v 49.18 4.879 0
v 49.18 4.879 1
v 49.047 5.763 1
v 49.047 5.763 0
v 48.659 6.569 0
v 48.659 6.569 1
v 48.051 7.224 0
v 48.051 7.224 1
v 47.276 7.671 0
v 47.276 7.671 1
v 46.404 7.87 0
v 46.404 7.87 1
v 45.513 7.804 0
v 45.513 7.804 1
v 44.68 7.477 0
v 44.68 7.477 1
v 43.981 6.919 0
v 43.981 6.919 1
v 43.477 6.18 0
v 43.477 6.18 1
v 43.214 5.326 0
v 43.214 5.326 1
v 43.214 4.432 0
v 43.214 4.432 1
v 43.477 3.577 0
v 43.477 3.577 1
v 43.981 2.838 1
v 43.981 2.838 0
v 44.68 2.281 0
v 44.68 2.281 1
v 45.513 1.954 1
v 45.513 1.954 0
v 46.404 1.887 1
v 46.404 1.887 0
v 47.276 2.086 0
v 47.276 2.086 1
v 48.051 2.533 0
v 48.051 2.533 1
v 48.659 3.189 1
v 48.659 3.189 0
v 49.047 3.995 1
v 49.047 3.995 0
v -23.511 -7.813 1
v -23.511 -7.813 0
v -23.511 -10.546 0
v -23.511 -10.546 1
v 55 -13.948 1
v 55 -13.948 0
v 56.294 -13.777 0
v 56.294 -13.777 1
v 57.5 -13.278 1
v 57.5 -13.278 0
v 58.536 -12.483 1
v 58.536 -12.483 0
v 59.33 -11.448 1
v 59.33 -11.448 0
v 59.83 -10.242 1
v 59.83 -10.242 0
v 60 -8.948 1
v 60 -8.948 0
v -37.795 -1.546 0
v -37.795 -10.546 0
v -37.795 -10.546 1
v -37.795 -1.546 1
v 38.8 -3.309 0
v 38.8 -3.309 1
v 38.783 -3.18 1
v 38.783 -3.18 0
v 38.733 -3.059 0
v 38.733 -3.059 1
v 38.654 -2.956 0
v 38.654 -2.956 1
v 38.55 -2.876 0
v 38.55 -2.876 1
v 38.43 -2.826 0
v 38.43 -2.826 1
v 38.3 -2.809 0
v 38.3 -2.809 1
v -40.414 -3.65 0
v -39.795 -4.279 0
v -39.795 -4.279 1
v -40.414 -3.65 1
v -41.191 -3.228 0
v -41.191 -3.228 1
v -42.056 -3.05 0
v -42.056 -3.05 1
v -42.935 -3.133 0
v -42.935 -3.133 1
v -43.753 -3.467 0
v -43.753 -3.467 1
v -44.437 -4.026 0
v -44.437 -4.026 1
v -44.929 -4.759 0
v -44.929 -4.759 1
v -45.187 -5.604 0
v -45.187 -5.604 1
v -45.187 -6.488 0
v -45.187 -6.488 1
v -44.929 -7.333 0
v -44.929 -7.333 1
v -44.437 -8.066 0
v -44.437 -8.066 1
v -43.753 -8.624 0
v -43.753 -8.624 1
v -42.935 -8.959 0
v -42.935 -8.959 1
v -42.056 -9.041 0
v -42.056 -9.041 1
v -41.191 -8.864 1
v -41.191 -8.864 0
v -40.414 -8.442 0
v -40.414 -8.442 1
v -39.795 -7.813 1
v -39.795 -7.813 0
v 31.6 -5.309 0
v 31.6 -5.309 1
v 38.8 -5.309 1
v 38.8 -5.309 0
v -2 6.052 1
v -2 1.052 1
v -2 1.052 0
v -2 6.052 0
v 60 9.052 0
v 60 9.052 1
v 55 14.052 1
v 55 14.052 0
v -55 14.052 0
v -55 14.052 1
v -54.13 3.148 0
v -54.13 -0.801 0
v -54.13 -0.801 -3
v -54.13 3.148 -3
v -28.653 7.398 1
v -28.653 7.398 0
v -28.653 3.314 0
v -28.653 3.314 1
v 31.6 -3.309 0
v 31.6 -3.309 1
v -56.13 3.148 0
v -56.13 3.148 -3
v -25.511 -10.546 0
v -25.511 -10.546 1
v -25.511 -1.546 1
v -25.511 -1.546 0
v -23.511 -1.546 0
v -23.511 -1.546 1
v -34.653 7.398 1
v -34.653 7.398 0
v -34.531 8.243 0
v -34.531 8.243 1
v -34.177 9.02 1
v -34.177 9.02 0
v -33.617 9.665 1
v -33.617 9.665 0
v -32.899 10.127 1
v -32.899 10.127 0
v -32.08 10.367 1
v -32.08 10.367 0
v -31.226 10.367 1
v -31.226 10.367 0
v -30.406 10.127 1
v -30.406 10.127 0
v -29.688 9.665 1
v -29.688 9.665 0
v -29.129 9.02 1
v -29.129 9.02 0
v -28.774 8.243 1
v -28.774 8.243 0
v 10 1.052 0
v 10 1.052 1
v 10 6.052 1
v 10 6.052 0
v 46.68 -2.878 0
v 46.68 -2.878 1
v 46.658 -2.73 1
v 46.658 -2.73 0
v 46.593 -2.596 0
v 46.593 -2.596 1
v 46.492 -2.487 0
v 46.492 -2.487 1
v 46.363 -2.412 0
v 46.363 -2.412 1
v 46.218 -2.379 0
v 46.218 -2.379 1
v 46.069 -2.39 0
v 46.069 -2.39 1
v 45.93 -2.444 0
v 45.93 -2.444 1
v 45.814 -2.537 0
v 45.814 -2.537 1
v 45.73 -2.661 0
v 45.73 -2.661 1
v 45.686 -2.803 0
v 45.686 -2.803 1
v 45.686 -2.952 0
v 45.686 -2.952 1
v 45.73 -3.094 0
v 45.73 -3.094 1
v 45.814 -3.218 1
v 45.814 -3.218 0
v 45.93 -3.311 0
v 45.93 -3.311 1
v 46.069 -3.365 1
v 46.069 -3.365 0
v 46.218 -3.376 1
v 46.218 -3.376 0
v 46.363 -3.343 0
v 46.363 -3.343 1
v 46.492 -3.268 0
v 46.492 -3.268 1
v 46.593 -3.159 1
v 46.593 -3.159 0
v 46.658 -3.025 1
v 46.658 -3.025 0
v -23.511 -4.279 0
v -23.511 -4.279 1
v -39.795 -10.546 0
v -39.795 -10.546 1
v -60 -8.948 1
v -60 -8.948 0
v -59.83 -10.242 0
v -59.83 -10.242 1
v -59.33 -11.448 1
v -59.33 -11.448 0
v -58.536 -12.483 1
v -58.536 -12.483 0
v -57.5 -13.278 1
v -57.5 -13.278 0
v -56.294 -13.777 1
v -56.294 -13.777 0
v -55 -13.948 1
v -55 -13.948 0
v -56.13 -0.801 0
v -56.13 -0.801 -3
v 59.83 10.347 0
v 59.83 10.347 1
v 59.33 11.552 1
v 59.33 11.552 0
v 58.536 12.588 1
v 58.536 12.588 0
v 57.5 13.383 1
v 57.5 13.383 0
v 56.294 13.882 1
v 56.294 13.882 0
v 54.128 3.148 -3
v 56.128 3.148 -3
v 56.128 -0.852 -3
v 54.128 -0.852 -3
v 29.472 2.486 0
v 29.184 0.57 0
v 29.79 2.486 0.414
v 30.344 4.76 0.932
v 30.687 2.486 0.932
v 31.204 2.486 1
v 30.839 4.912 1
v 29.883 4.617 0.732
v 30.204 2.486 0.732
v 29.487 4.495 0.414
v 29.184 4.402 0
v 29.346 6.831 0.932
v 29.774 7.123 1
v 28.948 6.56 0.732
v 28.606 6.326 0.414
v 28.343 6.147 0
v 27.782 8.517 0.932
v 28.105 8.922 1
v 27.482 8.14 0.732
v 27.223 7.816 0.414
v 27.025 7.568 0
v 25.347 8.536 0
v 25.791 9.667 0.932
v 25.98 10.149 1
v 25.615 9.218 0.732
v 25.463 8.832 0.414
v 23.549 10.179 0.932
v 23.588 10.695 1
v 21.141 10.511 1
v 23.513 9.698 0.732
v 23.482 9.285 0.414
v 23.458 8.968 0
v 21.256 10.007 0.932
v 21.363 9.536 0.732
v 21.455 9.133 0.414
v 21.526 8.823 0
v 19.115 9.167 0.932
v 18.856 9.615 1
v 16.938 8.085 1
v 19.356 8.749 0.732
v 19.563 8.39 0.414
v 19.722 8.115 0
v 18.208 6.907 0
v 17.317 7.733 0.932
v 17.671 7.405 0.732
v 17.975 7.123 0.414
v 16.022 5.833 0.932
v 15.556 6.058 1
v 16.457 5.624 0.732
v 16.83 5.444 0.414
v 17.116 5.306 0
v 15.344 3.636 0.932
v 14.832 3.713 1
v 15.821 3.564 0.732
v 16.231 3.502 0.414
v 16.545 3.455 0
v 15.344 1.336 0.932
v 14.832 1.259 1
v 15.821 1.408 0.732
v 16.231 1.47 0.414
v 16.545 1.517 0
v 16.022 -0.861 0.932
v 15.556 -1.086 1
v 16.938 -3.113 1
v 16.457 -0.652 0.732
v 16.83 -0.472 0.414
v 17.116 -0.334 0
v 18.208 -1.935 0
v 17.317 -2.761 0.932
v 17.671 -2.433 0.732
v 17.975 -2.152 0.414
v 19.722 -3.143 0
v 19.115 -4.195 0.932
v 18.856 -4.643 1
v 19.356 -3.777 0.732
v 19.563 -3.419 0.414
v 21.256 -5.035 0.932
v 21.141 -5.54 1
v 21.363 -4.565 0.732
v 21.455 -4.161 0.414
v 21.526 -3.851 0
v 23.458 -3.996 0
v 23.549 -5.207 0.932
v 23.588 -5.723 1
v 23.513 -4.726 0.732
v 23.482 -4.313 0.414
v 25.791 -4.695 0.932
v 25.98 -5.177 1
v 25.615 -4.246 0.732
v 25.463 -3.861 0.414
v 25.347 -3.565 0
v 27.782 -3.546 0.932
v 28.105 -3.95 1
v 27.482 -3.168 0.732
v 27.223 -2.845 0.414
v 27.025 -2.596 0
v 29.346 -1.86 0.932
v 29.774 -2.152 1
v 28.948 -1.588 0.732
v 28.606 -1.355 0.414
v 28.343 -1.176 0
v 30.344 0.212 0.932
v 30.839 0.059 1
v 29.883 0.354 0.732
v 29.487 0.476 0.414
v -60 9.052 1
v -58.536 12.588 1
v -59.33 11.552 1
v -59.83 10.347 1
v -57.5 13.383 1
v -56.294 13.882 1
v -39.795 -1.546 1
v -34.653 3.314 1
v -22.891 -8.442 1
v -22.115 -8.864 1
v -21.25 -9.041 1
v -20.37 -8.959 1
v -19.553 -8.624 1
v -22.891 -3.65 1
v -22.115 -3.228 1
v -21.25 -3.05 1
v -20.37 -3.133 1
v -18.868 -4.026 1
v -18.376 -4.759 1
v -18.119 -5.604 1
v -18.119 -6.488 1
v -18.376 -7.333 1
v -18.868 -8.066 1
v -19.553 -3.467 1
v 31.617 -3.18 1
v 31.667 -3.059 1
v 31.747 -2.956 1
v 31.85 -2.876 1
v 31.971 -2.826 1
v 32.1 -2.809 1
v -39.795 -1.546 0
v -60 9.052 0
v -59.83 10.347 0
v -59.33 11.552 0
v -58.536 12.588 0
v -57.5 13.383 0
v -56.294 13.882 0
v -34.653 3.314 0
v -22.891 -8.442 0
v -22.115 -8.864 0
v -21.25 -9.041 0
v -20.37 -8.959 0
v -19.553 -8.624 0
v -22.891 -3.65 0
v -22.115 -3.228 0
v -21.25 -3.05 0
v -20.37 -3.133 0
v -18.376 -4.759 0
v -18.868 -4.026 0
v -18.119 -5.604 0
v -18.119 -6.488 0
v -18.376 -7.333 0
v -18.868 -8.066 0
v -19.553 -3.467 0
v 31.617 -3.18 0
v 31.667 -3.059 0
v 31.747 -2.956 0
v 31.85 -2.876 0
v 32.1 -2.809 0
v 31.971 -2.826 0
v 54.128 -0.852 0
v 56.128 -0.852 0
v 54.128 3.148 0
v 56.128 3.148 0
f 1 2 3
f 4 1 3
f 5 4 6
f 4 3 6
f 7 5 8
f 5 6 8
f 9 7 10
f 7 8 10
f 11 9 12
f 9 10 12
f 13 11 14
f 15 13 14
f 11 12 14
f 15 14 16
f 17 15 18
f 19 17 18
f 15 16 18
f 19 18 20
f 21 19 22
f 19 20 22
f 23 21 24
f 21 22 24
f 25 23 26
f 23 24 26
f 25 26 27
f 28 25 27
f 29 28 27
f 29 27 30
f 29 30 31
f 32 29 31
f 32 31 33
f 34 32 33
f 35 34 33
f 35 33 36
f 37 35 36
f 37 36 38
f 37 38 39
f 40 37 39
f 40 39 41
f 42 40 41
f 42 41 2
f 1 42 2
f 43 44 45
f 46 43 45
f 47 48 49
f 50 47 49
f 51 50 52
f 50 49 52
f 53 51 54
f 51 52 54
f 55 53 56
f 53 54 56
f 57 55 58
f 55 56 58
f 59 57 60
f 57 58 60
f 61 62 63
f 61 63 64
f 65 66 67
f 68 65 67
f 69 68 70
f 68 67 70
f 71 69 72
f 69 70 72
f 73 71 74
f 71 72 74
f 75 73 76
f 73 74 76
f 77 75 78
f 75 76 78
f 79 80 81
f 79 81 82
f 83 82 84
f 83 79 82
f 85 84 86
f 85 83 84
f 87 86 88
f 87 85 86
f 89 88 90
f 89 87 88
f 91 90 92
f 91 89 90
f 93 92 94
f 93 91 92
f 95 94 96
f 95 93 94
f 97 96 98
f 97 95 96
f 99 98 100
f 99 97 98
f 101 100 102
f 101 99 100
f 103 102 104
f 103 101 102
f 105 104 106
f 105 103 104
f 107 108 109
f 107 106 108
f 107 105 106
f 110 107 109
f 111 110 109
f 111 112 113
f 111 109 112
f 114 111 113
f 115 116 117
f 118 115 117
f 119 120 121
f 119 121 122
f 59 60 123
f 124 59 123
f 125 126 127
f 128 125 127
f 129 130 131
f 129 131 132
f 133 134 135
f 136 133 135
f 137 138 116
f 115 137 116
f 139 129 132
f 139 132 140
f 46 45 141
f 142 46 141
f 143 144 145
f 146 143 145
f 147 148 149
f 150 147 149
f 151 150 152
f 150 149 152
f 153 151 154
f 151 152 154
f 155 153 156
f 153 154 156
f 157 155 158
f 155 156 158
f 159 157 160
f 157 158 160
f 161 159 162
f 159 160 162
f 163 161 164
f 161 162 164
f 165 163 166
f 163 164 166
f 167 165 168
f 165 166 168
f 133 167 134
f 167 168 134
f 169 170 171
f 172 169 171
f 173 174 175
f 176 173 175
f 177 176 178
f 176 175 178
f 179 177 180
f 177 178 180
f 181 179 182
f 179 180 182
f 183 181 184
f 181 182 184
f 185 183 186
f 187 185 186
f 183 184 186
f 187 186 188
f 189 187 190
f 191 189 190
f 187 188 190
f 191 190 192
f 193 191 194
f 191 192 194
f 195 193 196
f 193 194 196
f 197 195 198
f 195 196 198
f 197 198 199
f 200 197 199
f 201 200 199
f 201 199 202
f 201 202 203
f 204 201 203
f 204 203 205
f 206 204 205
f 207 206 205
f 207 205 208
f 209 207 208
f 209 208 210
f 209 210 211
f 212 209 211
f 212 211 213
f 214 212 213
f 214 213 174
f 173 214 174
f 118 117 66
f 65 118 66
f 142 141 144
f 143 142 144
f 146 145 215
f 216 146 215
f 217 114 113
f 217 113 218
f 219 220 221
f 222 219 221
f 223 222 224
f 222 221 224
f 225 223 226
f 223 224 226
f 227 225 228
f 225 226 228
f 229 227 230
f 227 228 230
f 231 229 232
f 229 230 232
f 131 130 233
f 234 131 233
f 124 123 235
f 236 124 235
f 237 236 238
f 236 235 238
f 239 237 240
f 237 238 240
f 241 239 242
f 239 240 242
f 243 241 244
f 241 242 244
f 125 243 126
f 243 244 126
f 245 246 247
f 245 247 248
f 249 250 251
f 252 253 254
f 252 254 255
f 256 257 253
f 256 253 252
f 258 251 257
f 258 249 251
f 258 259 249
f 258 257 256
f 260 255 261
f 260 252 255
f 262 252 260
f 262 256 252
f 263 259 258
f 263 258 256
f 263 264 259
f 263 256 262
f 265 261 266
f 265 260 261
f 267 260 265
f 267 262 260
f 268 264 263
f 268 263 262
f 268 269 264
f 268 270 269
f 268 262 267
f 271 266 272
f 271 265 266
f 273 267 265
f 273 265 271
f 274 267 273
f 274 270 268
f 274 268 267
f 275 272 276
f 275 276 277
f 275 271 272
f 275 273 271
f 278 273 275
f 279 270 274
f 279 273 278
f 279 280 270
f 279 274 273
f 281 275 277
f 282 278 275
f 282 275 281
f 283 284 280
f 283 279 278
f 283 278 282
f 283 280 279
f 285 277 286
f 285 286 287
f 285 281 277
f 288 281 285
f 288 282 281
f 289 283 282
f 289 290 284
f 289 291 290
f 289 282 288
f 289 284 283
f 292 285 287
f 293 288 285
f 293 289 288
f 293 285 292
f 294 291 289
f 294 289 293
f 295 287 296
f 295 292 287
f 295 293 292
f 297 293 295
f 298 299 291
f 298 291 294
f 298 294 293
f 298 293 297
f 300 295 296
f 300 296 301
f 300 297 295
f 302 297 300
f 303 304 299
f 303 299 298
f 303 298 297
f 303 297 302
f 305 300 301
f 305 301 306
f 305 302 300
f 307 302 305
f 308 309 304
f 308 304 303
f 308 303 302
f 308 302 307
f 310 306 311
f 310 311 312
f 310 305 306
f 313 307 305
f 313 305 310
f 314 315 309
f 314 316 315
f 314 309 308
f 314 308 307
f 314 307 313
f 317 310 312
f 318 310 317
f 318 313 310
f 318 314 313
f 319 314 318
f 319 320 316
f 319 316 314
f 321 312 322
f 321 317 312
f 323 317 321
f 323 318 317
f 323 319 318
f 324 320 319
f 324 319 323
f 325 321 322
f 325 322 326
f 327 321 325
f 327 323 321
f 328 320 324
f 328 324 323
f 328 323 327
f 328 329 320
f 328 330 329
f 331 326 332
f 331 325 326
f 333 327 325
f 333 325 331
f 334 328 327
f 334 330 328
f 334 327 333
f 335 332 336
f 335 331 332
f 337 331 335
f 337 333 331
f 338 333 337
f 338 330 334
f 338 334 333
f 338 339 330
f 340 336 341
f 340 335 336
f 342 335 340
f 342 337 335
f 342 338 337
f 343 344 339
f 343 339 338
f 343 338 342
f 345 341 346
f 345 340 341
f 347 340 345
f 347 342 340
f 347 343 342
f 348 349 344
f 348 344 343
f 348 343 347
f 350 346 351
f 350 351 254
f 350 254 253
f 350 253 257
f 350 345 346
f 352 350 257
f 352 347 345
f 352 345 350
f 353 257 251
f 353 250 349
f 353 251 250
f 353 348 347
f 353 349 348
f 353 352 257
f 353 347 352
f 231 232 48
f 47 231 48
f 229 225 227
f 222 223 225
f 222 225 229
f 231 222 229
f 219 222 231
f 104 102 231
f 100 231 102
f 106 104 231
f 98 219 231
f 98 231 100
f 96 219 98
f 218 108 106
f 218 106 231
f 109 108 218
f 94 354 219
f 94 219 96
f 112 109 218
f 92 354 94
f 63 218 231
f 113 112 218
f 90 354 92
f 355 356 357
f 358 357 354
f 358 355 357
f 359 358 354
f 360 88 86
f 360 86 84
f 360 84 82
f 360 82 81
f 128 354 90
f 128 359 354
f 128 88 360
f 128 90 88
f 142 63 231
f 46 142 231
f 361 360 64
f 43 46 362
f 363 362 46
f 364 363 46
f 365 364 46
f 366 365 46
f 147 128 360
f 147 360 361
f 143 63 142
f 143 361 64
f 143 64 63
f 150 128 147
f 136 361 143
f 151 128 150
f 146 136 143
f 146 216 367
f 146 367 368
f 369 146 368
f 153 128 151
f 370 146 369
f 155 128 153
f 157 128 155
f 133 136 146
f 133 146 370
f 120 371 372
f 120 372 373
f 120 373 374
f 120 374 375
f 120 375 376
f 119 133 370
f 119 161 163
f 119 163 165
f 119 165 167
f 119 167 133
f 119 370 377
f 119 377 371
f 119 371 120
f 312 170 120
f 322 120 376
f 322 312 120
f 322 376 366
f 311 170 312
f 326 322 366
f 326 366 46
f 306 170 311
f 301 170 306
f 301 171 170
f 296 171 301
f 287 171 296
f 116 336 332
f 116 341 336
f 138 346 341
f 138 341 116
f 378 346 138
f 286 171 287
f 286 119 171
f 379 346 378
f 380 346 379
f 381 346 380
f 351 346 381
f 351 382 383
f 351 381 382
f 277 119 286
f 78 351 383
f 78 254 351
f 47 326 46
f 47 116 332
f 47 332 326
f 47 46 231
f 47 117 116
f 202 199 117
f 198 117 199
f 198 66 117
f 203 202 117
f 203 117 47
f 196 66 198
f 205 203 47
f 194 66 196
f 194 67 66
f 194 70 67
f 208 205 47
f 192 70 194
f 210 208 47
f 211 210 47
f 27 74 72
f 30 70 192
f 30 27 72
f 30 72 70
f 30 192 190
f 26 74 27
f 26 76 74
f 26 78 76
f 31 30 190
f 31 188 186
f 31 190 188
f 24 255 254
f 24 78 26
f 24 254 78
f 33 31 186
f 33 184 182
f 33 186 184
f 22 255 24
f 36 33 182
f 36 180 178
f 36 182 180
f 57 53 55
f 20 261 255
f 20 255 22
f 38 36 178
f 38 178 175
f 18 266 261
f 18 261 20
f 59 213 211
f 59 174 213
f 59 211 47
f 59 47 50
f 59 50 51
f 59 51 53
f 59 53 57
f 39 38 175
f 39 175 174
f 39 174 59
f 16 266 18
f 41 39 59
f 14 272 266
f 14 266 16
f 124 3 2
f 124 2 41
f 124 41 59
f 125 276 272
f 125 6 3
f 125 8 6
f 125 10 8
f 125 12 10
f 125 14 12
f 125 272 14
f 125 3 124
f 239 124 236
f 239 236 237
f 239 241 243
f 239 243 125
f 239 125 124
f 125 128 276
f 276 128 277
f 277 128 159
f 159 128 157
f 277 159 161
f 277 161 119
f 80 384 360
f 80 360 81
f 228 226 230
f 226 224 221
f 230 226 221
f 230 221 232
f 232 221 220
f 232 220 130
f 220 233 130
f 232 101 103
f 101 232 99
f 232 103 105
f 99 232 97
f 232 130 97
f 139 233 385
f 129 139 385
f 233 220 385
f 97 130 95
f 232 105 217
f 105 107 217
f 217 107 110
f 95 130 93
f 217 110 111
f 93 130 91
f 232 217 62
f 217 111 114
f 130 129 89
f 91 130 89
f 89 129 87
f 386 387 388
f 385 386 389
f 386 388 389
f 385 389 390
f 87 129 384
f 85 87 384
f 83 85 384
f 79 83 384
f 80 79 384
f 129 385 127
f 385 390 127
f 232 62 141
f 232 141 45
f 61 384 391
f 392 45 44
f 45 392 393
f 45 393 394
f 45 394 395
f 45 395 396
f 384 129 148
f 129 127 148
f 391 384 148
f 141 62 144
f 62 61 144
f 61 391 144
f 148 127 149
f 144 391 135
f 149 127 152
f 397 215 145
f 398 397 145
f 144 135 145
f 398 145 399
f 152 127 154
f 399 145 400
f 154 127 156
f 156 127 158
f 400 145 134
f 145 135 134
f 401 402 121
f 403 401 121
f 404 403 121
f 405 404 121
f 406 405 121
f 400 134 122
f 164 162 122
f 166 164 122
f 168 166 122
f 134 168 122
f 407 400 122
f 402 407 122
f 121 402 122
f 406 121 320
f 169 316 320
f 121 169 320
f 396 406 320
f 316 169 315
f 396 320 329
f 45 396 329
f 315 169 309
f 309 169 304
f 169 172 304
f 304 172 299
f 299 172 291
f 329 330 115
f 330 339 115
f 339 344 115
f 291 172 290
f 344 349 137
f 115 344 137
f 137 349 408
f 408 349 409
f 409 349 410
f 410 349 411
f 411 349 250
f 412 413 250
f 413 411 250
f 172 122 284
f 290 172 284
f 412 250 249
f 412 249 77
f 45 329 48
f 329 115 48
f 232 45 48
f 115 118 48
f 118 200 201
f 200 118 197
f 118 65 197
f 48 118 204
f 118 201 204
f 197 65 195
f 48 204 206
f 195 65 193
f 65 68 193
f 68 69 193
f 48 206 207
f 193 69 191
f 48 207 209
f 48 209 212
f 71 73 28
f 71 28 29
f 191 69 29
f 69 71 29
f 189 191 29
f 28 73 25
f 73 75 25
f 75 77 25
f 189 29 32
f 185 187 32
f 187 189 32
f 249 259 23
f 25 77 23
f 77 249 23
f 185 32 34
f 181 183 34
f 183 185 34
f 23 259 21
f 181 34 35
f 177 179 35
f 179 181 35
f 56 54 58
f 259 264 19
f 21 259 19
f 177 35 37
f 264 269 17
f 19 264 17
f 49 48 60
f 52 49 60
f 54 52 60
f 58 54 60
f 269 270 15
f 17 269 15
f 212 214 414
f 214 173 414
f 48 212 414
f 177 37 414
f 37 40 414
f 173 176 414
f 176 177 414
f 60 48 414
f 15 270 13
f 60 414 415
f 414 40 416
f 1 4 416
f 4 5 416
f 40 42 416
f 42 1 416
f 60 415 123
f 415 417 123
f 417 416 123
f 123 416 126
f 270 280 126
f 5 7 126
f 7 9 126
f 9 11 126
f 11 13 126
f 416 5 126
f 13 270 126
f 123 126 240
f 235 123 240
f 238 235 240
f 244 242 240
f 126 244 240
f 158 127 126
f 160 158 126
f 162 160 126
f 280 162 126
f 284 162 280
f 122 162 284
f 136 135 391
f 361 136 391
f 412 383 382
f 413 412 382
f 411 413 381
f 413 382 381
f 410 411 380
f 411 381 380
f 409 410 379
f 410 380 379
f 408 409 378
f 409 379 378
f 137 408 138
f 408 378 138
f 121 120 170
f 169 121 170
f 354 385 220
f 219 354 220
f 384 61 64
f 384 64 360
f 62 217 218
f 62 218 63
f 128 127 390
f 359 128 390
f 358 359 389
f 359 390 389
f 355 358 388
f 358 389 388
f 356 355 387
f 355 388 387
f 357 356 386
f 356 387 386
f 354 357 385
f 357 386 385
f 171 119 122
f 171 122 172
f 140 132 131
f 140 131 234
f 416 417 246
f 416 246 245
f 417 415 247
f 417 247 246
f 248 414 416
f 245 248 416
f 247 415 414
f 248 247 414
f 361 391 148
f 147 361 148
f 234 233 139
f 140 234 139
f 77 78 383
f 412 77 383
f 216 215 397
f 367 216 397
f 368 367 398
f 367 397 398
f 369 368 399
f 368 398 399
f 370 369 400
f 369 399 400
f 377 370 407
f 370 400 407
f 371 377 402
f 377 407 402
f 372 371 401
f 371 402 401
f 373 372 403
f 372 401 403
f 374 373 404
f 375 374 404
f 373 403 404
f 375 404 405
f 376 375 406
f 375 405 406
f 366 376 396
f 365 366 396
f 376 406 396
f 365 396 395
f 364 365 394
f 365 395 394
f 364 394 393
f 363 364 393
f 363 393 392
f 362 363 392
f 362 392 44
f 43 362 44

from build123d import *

# Parameters (mm, degrees)
BOSS_EXTRUDE1_DEPTH      = 1
SKETCH11_W               = 12
SKETCH11_H               = 5
CUT_EXTRUDE7_DEPTH       = 10
SKETCH13_R               = 3
CUT_EXTRUDE9_DEPTH       = 10
CUT_EXTRUDE10_DEPTH      = 10
SKETCH21_R               = 6.5
CUT_EXTRUDE11_DEPTH      = 10
CUT_EXTRUDE17_DEPTH      = 10
CUT_EXTRUDE17_DEPTH_BACK = 10
SKETCH23_W               = 2
SKETCH23_H               = 4
BOSS_EXTRUDE2_DEPTH      = 3
SKETCH24_W               = 2
SKETCH24_H               = 3.949234692
BOSS_EXTRUDE3_DEPTH      = 3
FILLET1_R                = 2
SKETCH25_R               = 0.5
CUT_EXTRUDE18_DEPTH      = 10


with BuildPart() as part:
    # Sketch4 → Boss-Extrude1 (new body)
    with BuildSketch(Plane.XY):
        with BuildLine():
            Line((55, 14.052488348), (0, 14.052488348))
            Line((0, 14.052488348), (-55, 14.052488348))
            ThreePointArc((-55, 14.052488348), (-58.535533906, 12.588022254), (-60, 9.052488348))
            Line((-60, 9.052488348), (-60, -8.947511652))
            ThreePointArc((-60, -8.947511652), (-58.535533906, -12.483045558), (-55, -13.947511652))
            Line((-55, -13.947511652), (0, -13.947511652))
            Line((0, -13.947511652), (55, -13.947511652))
            ThreePointArc((55, -13.947511652), (58.535533906, -12.483045558), (60, -8.947511652))
            Line((60, -8.947511652), (60, 9.052488348))
            ThreePointArc((60, 9.052488348), (58.535533906, 12.588022254), (55, 14.052488348))
        make_face()
    extrude(amount=BOSS_EXTRUDE1_DEPTH)

    # Sketch11 → Cut-Extrude7 (cut)
    with BuildSketch(Plane.XY.offset(1)):
        with Locations((4, 3.552488348)):
            Rectangle(SKETCH11_W, SKETCH11_H)
    extrude(amount=-CUT_EXTRUDE7_DEPTH, mode=Mode.SUBTRACT)

    # Sketch13 → Cut-Extrude9 (cut)
    with BuildSketch(Plane.XY.offset(1)):
        with Locations((46.180246868, 4.878767266)):
            Circle(SKETCH13_R)
    extrude(amount=-CUT_EXTRUDE9_DEPTH, mode=Mode.SUBTRACT)

    # Sketch12 → Cut-Extrude10 (cut)
    with BuildSketch(Plane.XY.offset(1)):
        with BuildLine():
            Line((38.300111452, -2.809077948), (32.100111452, -2.809077948))
            ThreePointArc((32.100111452, -2.809077948), (31.746558061, -2.955524558), (31.600111452, -3.309077948))
            Line((31.600111452, -3.309077948), (31.600111452, -5.309077948))
            Line((31.600111452, -5.309077948), (38.800111452, -5.309077948))
            Line((38.800111452, -5.309077948), (38.800111452, -3.309077948))
            ThreePointArc((38.800111452, -3.309077948), (38.653664842, -2.955524558), (38.300111452, -2.809077948))
        make_face()
    extrude(amount=-CUT_EXTRUDE10_DEPTH, mode=Mode.SUBTRACT)

    # Sketch21 → Cut-Extrude11 (cut)
    with BuildSketch(Plane.XY.offset(1)):
        with Locations((22.972397633, 2.485770253)):
            Circle(SKETCH21_R)
    extrude(amount=-CUT_EXTRUDE11_DEPTH, mode=Mode.SUBTRACT)

    # Sketch22 → Cut-Extrude17 (cut, two sides: drawn at the far end of the back side and taken through both)
    with BuildSketch(Plane.XY.offset(-CUT_EXTRUDE17_DEPTH_BACK)):
        with BuildLine():
            Line((-39.794789509, -7.812631563), (-39.794789509, -10.545937078))
            Line((-39.794789509, -10.545937078), (-37.794789509, -10.545937078))
            Line((-37.794789509, -10.545937078), (-37.794789509, -1.545937078))
            Line((-37.794789509, -1.545937078), (-39.794789509, -1.545937078))
            Line((-39.794789509, -1.545937078), (-39.794789509, -4.279242592))
            ThreePointArc((-39.794789509, -4.279242592), (-45.219411252, -6.045937078), (-39.794789509, -7.812631563))
        make_face()
        with BuildLine():
            Line((-25.510698687, -1.545937078), (-23.510698687, -1.545937078))
            Line((-23.510698687, -1.545937078), (-23.510698687, -4.279242592))
            ThreePointArc((-23.510698687, -4.279242592), (-18.086076945, -6.045937078), (-23.510698687, -7.812631563))
            Line((-23.510698687, -7.812631563), (-23.510698687, -10.545937078))
            Line((-23.510698687, -10.545937078), (-25.510698687, -10.545937078))
            Line((-25.510698687, -10.545937078), (-25.510698687, -1.545937078))
        make_face()
        with BuildLine():
            Line((-31.652744098, 3.313523563), (-34.652744098, 3.313523563))
            Line((-34.652744098, 3.313523563), (-34.652744098, 7.397933855))
            ThreePointArc((-34.652744098, 7.397933855), (-31.652744098, 10.397933855), (-28.652744098, 7.397933855))
            Line((-28.652744098, 7.397933855), (-28.652744098, 3.313523563))
            Line((-28.652744098, 3.313523563), (-31.652744098, 3.313523563))
        make_face()
    extrude(amount=CUT_EXTRUDE17_DEPTH + CUT_EXTRUDE17_DEPTH_BACK, mode=Mode.SUBTRACT)

    # Sketch23 → Boss-Extrude2 (add)
    with BuildSketch(Plane(origin=(0, 0, 0), x_dir=(-1, 0, 0), z_dir=(0, 0, -1))):
        with Locations((-55.128215007, 1.148016517)):
            Rectangle(SKETCH23_W, SKETCH23_H)
    extrude(amount=BOSS_EXTRUDE2_DEPTH)

    # Sketch24 → Boss-Extrude3 (add)
    with BuildSketch(Plane(origin=(0, 0, 0), x_dir=(-1, 0, 0), z_dir=(0, 0, -1))):
        with Locations((55.13, 1.173399171)):
            Rectangle(SKETCH24_W, SKETCH24_H)
    extrude(amount=BOSS_EXTRUDE3_DEPTH)

    # Fillet1
    # the kernel refuses this fillet: 2 mm, written as the material it takes off along each edge
    with BuildSketch(Plane(origin=(22.972397633, 2.485770253, 1), x_dir=(1, 0, 0), z_dir=(0, -1, 0))) as fillet1_piece_1:
        with BuildLine():
            CenterArc((8.232050808, -2), FILLET1_R, 90, 60)
            Line((6.5, -1), (6.465358984, -0.98))
            ThreePointArc((6.465358984, -0.98), (6.46, -0.5), (6.46, 0))
            Line((6.46, 0), (6.5, 0.04))
            Line((6.5, 0.04), (8.232050808, 0.04))
            Line((8.232050808, 0.04), (8.232050808, 0))
        make_face()
    revolve(axis=Axis((22.972397633, 2.485770253, 1), (0, 0, 1)), mode=Mode.SUBTRACT)

    # Sketch25 → Cut-Extrude18 (cut)
    with BuildSketch(Plane.XY.offset(1)):
        with Locations((46.180246868, -2.877511652)):
            Circle(SKETCH25_R)
    extrude(amount=-CUT_EXTRUDE18_DEPTH, mode=Mode.SUBTRACT)


solid = part.part
